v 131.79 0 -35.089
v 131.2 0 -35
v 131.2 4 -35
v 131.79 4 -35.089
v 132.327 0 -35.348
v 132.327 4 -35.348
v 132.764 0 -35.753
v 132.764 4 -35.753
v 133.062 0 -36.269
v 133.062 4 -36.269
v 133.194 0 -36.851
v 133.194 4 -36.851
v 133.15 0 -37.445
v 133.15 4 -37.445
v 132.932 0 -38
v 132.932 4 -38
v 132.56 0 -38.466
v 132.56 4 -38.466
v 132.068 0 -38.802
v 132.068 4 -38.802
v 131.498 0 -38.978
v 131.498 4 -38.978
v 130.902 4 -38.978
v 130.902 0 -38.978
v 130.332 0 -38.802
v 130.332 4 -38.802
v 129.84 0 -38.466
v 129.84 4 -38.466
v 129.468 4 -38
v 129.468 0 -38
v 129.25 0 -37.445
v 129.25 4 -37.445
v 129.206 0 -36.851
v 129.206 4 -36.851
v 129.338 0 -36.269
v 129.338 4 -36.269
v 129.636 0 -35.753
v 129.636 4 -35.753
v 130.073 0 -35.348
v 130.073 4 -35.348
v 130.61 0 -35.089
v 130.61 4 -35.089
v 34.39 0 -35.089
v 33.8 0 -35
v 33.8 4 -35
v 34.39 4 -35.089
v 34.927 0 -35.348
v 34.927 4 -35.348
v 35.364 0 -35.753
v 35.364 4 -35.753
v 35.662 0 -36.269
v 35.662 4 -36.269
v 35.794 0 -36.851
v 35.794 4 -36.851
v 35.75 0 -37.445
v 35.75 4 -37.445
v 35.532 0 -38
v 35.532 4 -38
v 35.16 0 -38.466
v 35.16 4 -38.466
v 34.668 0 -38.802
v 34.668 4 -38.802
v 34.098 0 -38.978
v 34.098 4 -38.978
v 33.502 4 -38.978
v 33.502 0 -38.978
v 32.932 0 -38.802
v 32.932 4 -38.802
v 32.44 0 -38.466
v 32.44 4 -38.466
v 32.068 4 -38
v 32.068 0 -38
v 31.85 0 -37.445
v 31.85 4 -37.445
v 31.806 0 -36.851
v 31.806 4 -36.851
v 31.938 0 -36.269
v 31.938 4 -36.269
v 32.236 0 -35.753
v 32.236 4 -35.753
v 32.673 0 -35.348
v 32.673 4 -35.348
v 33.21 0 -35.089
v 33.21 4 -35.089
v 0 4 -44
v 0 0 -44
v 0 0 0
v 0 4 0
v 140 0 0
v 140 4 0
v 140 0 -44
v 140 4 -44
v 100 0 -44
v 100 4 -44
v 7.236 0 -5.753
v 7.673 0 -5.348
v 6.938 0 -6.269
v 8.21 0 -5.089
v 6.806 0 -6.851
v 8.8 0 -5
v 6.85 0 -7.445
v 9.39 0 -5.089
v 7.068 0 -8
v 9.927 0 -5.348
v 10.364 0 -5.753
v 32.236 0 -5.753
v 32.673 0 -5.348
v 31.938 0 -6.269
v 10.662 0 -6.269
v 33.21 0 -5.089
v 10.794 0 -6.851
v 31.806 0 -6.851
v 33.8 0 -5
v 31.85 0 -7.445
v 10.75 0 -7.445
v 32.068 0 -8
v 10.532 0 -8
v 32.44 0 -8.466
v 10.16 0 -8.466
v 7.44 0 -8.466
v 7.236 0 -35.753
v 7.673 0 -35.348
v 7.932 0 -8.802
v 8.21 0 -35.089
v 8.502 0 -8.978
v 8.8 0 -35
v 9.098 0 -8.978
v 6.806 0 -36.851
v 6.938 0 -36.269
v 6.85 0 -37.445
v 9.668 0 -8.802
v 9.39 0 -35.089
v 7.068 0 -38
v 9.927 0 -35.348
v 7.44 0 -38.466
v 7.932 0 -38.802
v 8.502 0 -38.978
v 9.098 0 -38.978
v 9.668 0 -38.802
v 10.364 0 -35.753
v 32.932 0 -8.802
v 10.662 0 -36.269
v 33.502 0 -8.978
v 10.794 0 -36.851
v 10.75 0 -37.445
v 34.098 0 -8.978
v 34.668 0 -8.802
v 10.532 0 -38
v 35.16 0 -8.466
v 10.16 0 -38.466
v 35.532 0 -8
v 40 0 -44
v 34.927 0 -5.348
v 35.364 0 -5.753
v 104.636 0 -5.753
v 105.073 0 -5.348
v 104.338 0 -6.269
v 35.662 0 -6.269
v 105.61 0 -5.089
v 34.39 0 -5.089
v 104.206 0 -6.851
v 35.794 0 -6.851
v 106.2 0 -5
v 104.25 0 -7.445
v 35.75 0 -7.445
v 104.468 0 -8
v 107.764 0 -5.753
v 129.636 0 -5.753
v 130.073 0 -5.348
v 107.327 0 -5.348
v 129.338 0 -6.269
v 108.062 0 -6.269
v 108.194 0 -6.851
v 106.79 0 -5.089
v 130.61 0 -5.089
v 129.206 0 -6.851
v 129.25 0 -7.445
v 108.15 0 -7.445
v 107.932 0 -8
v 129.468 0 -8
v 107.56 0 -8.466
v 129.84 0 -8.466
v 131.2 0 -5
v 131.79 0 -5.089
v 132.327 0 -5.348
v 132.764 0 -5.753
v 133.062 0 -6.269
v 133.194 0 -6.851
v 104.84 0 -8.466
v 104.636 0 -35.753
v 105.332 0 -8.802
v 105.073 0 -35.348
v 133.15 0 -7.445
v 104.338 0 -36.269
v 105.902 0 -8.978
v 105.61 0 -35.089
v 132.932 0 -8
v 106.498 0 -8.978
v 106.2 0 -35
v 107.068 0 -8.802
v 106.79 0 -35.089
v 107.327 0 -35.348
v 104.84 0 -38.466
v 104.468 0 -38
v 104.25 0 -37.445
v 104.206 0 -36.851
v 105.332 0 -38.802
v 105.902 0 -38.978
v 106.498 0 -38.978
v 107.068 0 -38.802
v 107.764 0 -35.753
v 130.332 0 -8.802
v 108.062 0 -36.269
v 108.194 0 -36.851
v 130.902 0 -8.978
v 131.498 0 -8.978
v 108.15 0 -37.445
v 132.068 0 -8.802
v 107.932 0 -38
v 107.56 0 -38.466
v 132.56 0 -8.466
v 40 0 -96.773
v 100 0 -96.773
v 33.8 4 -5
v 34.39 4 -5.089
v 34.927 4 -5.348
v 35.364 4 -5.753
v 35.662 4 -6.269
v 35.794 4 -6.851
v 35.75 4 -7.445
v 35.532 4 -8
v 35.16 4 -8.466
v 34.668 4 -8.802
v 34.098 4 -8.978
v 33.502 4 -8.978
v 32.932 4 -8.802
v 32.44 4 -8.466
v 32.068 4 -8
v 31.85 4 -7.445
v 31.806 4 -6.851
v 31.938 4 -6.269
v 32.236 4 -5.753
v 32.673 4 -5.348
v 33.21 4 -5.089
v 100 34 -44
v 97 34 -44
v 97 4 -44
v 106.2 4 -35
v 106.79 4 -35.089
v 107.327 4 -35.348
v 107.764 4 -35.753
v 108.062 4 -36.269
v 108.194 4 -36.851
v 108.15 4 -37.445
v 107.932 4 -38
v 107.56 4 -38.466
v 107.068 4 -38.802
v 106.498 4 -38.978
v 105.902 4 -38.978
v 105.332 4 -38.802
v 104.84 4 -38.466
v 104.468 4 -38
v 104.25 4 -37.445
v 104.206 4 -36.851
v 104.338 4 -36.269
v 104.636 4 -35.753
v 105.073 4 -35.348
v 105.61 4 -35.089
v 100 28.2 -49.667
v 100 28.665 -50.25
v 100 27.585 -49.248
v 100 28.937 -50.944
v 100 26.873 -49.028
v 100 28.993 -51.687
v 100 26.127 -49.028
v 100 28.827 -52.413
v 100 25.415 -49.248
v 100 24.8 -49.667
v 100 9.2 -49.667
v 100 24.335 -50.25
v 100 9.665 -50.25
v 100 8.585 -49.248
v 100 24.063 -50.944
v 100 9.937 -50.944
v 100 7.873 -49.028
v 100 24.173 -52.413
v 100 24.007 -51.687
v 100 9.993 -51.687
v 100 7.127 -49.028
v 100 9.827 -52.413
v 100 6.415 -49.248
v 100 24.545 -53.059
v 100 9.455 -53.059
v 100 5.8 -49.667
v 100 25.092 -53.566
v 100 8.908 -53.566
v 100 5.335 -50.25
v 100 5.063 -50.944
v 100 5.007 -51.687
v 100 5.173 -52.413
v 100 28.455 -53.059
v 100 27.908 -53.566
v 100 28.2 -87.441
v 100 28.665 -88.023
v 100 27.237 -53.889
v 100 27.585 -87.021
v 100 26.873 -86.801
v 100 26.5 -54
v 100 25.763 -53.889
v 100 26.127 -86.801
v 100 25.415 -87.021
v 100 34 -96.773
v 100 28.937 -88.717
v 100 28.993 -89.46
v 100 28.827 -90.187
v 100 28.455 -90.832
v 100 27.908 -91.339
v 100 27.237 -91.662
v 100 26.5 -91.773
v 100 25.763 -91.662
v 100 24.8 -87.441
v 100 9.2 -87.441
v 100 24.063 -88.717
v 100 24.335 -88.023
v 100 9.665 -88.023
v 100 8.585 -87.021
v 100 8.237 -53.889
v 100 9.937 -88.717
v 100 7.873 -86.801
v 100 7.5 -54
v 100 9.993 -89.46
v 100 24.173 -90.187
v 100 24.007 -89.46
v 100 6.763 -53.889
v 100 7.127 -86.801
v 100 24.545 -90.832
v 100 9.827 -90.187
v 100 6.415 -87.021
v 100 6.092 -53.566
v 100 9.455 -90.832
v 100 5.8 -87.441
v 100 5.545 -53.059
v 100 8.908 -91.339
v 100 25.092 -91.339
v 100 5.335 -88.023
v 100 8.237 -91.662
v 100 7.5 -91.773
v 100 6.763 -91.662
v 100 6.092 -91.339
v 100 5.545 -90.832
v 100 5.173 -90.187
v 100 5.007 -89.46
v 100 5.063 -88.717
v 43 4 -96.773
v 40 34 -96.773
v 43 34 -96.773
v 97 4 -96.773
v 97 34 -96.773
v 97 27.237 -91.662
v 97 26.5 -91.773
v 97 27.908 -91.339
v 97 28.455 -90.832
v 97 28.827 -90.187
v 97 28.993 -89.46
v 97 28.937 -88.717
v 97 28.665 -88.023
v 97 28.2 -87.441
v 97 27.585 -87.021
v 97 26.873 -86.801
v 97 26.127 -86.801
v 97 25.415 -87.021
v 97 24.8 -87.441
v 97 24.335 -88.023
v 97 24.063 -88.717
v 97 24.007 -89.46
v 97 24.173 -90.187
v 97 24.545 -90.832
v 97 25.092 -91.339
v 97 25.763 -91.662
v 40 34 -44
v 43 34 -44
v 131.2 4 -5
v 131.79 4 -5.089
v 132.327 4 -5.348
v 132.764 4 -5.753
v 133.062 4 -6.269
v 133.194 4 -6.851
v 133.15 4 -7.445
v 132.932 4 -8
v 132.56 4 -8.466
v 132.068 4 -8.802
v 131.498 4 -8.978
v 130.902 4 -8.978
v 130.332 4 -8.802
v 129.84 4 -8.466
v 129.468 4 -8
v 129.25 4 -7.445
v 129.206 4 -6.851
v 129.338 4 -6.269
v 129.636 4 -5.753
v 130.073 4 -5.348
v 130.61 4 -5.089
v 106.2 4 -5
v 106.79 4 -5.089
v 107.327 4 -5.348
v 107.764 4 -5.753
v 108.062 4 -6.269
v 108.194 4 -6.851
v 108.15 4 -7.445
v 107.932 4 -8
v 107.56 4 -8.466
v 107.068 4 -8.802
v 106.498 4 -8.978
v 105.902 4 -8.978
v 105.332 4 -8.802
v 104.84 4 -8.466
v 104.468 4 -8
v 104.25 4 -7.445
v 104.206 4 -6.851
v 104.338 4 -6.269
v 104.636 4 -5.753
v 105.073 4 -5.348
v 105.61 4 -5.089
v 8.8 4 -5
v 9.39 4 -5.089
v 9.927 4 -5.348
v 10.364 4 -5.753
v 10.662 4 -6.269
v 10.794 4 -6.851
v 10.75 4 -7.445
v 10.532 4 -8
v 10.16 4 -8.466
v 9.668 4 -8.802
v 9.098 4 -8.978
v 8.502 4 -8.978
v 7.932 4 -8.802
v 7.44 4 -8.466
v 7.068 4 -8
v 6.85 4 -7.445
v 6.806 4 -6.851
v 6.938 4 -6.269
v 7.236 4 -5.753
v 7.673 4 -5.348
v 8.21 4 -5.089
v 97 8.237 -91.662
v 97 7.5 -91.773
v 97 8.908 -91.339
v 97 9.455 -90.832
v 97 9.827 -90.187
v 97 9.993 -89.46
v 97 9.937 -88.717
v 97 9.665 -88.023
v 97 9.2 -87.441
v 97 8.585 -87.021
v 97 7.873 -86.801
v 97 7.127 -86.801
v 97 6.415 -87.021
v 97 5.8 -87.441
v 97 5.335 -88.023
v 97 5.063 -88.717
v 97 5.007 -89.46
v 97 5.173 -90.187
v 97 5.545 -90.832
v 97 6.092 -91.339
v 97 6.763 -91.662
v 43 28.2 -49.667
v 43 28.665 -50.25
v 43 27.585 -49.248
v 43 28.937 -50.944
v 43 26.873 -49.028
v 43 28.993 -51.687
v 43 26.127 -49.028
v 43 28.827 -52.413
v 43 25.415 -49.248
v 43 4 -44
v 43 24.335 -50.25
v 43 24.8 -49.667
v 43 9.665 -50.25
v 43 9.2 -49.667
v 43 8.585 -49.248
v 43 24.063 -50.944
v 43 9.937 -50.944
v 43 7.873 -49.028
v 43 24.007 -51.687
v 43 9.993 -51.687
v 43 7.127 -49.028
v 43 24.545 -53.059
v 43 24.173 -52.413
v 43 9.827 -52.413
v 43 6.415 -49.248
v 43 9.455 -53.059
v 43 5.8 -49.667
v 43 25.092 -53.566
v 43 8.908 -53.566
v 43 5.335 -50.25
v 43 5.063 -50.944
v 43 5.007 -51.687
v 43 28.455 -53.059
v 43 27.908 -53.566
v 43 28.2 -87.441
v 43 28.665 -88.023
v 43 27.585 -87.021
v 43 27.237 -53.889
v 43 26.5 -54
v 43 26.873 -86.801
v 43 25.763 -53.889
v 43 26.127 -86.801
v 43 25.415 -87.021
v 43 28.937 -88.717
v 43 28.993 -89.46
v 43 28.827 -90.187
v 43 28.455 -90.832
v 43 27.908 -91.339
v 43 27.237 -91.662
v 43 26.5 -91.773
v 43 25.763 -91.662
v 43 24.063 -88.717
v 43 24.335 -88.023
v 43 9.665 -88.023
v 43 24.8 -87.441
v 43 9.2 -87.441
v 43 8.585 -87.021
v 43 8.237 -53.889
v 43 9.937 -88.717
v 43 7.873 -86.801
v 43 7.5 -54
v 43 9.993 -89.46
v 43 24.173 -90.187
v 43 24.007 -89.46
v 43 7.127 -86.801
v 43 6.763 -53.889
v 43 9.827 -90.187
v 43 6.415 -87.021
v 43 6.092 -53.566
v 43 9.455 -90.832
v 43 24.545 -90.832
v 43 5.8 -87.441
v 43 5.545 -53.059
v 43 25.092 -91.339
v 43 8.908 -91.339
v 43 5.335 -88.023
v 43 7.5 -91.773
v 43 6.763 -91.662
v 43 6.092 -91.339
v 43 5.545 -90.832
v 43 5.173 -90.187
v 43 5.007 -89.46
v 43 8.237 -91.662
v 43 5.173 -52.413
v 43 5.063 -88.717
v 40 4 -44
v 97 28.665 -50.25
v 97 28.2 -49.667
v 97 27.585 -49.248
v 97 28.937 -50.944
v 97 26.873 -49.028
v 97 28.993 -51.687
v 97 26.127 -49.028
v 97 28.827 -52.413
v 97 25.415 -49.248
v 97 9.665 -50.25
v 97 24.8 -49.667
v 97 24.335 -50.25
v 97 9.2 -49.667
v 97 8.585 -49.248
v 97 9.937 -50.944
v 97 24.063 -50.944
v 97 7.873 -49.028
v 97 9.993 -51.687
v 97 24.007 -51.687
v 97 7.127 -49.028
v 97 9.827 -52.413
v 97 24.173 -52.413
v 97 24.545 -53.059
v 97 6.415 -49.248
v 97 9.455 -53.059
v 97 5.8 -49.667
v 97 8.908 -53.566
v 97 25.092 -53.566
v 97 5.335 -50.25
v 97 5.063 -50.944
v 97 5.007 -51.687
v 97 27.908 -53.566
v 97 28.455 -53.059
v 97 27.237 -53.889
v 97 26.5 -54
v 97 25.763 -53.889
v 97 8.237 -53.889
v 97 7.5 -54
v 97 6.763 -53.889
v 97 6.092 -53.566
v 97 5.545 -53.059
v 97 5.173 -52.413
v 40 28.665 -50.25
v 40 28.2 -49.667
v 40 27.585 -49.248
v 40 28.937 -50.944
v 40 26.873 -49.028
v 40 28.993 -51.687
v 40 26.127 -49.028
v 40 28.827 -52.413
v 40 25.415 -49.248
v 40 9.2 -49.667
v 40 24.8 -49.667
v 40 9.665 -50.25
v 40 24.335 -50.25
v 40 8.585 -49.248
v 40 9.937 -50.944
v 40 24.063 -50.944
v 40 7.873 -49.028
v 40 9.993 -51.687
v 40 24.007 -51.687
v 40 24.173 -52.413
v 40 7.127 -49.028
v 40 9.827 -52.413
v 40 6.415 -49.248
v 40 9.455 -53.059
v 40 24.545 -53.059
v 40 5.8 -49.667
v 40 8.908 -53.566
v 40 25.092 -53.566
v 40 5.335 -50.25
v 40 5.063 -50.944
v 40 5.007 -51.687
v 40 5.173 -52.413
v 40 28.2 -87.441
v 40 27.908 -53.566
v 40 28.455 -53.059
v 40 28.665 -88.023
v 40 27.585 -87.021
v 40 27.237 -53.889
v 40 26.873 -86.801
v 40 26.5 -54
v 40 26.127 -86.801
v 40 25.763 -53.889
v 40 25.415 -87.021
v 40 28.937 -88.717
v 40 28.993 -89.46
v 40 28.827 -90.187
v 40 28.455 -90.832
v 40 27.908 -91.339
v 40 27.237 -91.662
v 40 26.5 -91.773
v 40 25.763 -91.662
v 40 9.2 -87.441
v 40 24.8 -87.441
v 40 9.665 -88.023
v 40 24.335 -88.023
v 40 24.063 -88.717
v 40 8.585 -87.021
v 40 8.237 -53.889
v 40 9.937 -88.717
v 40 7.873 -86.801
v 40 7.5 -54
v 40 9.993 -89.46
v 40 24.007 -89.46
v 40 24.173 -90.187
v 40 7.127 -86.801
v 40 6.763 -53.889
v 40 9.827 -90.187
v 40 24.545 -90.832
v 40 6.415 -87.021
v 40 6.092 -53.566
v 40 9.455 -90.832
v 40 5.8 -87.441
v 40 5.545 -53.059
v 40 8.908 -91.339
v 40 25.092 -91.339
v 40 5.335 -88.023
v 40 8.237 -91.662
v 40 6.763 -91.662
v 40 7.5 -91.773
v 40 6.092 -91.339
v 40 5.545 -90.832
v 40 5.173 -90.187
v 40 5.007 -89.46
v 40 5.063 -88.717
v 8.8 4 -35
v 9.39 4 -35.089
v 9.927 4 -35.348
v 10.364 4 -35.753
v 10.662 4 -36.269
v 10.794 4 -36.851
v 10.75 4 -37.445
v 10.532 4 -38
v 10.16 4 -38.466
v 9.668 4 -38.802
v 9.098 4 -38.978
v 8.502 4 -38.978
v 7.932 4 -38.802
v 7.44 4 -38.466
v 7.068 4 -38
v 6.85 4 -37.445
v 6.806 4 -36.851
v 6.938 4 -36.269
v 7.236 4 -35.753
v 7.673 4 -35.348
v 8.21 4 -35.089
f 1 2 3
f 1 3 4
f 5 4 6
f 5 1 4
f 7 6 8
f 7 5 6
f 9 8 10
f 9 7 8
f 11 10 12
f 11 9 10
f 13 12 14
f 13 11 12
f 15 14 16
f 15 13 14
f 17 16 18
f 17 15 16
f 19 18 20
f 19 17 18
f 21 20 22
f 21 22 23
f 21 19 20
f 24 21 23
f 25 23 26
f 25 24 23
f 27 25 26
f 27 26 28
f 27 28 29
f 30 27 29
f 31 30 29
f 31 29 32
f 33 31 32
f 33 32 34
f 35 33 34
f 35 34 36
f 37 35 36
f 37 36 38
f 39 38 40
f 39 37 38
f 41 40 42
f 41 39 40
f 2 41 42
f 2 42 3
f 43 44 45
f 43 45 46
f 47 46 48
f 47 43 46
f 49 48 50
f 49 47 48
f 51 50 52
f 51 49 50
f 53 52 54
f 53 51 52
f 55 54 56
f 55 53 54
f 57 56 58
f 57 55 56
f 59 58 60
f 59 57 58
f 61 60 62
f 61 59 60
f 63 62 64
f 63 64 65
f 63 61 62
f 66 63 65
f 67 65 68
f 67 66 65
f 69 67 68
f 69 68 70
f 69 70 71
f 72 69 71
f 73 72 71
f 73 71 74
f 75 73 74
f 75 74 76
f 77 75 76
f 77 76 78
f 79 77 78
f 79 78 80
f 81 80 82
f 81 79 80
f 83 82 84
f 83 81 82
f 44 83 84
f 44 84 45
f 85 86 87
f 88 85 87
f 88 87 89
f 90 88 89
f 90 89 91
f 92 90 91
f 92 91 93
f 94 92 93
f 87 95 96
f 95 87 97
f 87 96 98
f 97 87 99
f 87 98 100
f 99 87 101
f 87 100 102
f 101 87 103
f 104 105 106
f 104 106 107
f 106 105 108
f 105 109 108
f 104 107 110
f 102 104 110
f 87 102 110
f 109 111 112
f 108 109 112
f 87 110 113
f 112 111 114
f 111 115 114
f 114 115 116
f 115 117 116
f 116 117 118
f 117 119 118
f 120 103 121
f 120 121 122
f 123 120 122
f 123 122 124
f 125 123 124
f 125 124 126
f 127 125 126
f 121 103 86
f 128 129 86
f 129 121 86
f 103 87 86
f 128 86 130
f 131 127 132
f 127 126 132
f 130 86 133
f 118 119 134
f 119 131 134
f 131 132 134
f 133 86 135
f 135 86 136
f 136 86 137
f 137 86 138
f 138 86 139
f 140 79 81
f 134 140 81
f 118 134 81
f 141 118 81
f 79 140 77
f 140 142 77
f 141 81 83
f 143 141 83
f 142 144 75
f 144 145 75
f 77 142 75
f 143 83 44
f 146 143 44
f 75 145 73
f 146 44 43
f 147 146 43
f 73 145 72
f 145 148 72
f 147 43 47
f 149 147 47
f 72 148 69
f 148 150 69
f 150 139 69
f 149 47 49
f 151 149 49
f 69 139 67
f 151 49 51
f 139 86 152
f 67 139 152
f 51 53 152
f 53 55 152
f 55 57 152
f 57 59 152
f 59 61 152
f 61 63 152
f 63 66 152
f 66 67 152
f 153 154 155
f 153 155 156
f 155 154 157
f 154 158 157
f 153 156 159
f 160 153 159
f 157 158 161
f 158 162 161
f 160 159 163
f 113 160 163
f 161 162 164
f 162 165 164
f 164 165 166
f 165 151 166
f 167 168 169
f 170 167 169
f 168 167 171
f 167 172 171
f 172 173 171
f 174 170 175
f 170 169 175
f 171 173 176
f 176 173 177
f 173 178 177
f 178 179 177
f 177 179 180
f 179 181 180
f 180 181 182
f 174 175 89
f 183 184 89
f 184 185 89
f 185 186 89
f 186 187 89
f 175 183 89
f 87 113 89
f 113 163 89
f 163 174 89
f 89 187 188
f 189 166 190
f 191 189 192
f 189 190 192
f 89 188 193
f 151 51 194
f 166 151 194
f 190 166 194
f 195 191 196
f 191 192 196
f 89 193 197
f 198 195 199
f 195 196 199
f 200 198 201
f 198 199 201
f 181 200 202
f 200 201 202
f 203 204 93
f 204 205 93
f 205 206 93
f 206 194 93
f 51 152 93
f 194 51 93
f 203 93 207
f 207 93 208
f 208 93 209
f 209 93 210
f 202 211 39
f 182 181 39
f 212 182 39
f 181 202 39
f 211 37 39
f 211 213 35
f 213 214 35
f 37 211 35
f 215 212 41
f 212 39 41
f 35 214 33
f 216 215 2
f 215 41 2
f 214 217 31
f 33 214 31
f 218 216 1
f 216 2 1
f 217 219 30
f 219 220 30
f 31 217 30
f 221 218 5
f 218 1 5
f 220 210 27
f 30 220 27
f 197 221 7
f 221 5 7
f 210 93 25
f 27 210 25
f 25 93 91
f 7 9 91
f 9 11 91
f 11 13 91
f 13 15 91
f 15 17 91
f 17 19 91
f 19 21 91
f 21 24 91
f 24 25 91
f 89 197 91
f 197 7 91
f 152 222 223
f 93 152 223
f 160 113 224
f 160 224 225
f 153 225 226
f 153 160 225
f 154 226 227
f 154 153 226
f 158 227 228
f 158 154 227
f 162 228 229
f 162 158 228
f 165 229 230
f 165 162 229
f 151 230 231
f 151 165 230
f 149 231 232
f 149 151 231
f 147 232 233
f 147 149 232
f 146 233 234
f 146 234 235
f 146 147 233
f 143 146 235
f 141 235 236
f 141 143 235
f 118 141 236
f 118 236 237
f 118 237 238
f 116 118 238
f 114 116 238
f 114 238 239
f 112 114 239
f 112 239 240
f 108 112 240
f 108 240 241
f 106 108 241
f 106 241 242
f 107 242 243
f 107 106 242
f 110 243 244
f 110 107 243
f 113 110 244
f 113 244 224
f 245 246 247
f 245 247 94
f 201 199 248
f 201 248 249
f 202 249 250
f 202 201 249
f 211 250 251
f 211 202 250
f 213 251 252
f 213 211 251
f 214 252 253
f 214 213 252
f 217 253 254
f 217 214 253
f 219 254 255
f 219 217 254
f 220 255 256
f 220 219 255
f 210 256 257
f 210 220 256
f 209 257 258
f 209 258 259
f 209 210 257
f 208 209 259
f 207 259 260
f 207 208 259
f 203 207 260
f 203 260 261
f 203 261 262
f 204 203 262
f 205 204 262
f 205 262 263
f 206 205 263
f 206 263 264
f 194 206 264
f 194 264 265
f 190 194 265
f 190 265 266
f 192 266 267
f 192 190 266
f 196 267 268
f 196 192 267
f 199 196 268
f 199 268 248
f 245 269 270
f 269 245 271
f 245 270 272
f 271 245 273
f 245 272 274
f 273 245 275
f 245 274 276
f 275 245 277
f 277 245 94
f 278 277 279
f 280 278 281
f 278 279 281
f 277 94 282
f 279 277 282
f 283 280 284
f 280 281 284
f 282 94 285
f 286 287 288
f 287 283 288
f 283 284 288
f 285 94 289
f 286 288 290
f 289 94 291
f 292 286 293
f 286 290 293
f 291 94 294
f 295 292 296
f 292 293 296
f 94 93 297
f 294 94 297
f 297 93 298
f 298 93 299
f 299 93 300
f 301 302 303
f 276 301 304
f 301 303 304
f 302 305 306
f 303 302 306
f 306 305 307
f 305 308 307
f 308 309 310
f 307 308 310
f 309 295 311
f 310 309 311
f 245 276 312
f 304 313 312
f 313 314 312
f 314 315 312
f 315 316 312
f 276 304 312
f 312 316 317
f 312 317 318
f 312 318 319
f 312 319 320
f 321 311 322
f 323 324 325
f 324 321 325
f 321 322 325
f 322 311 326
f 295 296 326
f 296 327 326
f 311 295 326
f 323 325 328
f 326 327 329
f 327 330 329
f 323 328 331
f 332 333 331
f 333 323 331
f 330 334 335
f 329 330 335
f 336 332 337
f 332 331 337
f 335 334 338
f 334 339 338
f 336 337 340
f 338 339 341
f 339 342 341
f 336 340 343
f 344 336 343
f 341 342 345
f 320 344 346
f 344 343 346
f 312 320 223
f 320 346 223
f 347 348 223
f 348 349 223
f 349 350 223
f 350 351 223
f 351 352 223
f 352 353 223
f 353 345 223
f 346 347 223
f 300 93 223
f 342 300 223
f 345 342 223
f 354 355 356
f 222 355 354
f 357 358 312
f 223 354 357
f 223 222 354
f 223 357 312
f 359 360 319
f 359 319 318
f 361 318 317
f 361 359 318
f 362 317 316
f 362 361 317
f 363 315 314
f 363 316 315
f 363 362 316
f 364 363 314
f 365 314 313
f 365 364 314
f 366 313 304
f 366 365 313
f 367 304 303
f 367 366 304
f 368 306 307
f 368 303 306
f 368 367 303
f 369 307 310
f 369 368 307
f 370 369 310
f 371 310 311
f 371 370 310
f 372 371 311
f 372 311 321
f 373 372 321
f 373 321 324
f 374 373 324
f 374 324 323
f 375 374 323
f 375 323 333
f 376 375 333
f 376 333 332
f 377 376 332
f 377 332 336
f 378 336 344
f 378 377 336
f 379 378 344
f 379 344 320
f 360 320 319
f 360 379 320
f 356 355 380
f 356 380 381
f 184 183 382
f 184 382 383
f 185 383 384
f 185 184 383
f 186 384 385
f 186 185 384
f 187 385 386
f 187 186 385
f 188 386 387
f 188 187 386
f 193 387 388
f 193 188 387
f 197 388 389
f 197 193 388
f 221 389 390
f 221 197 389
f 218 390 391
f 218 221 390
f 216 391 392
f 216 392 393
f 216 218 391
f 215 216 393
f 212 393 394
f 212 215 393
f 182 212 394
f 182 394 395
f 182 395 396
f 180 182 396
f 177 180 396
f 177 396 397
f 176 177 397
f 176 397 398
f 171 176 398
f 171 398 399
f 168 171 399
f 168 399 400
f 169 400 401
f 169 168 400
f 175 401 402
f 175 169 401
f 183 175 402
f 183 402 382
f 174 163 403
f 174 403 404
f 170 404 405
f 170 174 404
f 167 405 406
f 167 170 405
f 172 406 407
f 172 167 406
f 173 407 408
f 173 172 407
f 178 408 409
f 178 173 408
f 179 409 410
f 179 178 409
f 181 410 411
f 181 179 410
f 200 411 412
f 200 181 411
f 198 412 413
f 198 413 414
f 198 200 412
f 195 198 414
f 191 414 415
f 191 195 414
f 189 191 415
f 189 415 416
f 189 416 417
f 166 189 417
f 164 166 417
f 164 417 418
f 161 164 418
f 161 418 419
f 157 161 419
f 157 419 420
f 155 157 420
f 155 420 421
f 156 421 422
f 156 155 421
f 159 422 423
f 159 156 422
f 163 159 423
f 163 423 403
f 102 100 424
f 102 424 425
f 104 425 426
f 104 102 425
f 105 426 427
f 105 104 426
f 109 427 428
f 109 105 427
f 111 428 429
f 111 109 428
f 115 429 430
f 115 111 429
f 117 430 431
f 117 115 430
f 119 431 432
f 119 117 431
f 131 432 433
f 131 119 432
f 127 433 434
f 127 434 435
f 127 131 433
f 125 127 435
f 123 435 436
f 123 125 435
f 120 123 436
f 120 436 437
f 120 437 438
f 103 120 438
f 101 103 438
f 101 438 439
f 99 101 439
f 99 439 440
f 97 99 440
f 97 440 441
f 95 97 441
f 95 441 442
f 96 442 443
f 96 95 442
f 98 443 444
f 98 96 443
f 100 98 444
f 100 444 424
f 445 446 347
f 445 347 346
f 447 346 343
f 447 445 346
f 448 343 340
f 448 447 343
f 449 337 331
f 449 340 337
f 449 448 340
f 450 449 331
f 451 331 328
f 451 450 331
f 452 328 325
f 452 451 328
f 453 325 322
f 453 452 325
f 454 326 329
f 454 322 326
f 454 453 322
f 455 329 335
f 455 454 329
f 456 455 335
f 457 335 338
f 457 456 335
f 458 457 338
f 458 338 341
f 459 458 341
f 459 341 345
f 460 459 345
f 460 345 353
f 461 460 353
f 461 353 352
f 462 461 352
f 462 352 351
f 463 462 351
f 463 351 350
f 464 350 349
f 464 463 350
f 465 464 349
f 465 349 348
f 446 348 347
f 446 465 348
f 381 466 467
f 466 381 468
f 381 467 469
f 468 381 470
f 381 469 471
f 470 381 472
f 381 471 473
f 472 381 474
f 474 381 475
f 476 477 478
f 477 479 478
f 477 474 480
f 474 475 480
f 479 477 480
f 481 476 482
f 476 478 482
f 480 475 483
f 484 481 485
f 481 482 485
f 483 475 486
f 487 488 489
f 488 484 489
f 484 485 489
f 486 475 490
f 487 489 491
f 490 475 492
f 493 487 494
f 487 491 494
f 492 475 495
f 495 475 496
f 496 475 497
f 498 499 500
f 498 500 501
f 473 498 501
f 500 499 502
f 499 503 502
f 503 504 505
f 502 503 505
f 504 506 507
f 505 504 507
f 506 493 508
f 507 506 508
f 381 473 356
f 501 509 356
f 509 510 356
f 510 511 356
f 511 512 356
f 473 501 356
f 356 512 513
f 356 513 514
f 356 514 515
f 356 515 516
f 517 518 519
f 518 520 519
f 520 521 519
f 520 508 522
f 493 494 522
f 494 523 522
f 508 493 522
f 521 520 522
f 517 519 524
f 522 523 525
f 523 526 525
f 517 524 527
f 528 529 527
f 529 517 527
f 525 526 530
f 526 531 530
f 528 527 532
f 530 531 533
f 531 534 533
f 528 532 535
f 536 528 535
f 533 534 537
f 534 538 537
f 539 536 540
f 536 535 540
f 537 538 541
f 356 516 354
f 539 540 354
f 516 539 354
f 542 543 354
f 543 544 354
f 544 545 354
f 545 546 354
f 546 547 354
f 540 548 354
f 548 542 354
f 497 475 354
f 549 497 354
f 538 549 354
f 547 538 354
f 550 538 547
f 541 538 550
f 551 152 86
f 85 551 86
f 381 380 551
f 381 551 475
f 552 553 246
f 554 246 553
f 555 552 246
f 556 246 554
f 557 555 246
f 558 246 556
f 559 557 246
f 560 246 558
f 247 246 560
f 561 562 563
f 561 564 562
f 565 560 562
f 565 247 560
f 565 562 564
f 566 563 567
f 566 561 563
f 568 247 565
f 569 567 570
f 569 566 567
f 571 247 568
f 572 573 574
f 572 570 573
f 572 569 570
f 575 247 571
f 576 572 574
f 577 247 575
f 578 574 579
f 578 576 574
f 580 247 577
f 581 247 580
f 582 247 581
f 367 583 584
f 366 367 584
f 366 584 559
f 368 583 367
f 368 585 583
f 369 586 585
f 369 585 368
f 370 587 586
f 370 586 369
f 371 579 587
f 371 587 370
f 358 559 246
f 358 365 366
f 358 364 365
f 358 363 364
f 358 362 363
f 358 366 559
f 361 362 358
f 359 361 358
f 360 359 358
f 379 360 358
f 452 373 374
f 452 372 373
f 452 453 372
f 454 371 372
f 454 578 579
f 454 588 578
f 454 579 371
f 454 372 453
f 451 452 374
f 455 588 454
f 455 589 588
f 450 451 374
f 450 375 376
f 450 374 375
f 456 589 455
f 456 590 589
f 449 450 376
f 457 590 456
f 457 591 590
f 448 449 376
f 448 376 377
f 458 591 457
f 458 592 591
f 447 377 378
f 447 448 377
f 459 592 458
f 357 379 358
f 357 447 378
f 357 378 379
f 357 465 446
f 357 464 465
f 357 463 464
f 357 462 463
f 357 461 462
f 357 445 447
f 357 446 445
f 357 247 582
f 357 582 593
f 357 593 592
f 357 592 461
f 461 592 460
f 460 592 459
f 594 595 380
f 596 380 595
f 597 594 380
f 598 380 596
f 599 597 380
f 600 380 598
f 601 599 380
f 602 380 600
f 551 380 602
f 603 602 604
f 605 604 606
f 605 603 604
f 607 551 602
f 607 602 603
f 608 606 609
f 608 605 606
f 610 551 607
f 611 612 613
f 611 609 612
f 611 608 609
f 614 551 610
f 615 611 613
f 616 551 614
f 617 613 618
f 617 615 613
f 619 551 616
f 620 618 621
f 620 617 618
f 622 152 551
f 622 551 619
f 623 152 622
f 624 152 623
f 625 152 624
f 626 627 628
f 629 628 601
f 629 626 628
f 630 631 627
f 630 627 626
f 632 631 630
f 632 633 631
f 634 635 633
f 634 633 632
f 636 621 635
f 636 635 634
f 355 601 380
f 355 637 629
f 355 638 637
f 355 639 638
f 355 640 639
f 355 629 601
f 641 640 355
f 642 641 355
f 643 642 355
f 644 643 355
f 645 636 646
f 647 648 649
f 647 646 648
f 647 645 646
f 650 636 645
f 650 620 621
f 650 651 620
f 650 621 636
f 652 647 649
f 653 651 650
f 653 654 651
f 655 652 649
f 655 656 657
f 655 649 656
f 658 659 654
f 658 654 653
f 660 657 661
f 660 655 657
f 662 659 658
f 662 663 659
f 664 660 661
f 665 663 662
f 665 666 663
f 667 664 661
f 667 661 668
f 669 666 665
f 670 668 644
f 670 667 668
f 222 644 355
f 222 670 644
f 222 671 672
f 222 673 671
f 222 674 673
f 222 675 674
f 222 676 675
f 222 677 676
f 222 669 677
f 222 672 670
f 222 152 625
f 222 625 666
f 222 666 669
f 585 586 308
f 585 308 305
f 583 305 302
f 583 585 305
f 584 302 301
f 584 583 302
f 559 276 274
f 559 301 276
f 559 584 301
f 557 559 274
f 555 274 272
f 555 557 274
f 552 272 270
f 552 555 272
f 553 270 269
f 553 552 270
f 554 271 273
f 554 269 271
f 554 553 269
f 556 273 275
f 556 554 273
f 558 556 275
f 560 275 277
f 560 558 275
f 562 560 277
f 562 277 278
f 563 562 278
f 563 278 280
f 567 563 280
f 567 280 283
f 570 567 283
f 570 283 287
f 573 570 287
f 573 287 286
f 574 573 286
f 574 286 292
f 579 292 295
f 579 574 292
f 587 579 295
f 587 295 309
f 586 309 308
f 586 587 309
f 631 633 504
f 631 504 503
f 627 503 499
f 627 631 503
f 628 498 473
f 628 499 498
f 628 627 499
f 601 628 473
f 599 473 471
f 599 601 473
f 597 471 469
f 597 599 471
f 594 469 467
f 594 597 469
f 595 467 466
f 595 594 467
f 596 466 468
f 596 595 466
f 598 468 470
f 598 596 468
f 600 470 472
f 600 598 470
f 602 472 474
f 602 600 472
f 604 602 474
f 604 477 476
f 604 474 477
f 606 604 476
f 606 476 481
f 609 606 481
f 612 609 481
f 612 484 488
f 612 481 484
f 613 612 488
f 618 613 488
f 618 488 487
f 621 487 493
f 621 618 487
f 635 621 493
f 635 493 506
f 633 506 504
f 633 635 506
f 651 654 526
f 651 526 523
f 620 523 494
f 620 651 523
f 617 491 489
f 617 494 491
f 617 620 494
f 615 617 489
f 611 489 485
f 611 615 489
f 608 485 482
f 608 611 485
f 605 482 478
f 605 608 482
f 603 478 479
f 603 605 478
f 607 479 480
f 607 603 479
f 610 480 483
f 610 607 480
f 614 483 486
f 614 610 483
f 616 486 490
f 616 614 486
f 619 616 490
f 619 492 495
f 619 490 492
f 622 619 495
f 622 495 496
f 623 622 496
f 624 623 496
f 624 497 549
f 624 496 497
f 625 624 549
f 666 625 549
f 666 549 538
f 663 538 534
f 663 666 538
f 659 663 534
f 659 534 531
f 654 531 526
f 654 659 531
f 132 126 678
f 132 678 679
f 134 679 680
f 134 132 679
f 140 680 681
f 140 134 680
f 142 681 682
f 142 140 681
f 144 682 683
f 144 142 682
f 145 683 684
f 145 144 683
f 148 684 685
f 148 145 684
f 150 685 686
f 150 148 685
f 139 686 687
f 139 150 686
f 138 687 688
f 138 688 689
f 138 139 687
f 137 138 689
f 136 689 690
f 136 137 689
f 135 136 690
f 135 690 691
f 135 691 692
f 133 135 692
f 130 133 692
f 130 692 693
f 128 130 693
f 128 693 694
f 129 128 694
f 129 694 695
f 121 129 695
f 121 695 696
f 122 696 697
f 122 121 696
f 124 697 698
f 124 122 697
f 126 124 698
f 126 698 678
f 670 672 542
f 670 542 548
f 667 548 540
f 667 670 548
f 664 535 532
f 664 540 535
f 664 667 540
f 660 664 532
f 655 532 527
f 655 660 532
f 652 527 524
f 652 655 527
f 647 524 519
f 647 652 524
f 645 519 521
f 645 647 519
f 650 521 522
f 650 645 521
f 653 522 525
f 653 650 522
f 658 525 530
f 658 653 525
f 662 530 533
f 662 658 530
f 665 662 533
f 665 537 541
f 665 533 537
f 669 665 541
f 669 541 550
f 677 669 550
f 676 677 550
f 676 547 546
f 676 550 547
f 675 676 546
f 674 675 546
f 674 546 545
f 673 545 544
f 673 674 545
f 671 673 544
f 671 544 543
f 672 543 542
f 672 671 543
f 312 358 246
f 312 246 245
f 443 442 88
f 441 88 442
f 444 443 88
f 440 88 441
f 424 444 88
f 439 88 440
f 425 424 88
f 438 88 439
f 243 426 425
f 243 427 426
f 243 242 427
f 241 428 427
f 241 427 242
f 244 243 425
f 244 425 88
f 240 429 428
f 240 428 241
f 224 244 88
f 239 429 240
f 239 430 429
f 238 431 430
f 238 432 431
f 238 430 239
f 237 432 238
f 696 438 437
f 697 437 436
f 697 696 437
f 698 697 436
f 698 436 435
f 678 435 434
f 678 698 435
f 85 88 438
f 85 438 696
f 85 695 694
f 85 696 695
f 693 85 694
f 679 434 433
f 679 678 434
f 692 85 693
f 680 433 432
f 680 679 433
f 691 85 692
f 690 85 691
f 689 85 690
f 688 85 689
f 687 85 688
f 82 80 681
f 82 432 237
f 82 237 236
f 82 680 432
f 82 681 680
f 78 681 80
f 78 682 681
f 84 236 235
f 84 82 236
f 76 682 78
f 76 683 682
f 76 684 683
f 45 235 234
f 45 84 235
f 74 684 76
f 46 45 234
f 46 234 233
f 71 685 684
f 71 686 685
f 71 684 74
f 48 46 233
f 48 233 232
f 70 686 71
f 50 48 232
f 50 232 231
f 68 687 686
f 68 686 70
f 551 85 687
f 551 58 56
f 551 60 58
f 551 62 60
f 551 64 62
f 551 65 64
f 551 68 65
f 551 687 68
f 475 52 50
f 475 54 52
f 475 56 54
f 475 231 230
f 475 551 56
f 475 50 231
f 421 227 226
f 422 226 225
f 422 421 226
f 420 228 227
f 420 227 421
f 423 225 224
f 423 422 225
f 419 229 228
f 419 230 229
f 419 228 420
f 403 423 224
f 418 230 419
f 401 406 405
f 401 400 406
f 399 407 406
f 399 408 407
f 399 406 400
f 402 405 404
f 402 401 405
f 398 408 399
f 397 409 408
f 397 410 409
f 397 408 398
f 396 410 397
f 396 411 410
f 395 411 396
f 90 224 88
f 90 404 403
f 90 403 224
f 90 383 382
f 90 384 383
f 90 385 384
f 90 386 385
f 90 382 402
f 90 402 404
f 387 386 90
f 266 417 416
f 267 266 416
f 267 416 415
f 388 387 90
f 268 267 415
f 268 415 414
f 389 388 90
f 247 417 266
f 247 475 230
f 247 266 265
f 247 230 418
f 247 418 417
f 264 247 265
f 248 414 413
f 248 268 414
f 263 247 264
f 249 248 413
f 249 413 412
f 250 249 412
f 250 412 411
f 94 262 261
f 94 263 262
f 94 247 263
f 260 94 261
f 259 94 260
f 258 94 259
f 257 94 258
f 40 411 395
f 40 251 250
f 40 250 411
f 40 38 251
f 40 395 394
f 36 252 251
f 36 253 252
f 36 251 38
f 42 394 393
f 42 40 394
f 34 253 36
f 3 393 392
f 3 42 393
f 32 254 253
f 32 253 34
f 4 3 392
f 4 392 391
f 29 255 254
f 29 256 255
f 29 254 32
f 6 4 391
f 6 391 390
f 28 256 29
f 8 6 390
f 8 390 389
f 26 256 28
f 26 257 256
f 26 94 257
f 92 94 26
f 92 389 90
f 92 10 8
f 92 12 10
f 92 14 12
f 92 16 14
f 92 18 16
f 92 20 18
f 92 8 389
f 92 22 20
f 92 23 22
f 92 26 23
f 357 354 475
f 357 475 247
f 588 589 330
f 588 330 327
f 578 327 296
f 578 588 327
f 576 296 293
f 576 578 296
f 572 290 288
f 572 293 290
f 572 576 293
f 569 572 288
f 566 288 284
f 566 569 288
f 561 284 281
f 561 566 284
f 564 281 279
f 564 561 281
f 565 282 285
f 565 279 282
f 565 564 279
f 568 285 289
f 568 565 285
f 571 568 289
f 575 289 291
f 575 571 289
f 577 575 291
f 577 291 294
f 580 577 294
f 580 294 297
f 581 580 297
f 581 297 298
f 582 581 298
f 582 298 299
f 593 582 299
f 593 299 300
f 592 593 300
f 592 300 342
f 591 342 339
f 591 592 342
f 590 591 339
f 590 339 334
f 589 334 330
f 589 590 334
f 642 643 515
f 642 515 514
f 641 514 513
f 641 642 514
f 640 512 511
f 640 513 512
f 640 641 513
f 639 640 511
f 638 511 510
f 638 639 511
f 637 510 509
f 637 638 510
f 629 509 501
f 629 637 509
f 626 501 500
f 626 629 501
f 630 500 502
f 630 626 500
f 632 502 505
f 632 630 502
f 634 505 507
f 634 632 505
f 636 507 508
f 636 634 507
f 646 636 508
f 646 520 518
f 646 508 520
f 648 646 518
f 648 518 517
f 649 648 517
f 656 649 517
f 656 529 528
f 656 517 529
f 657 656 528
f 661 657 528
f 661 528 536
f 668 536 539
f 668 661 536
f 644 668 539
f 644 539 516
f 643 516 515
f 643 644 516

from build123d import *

# Parameters (mm, degrees)
SKETCH_1_R               = 2
EXTRUDE_1_DEPTH          = 4
SKETCH_1_3_W             = 3
SKETCH_1_3_H             = 52.773364798
EXTRUDE_2_DEPTH          = 34
CUT_EXTRUDE_1_DEPTH      = 174.554268557
CUT_EXTRUDE_1_DEPTH_BACK = 174.554268557
SKETCH_2_R               = 2.5


with BuildPart() as part:
    # 草图1 → 凸台-拉伸1 (new body)
    with BuildSketch(Plane(origin=(0, 0, 0), x_dir=(1, 0, 0), z_dir=(0, 1, 0))):
        Polygon((0, 0), (140, 0), (140, 44), (97, 44), (97, 96.773364798), (43, 96.773364798), (43, 44), (0, 44), align=None)
        with Locations((8.8, 7)):
            Circle(SKETCH_1_R, mode=Mode.SUBTRACT)
        with Locations((33.8, 7)):
            Circle(SKETCH_1_R, mode=Mode.SUBTRACT)
        with Locations((8.8, 37)):
            Circle(SKETCH_1_R, mode=Mode.SUBTRACT)
        with Locations((33.8, 37)):
            Circle(SKETCH_1_R, mode=Mode.SUBTRACT)
        with Locations((131.2, 37)):
            Circle(SKETCH_1_R, mode=Mode.SUBTRACT)
        with Locations((106.2, 37)):
            Circle(SKETCH_1_R, mode=Mode.SUBTRACT)
        with Locations((106.2, 7)):
            Circle(SKETCH_1_R, mode=Mode.SUBTRACT)
        with Locations((131.2, 7)):
            Circle(SKETCH_1_R, mode=Mode.SUBTRACT)
    extrude(amount=EXTRUDE_1_DEPTH)

    # 草图1<3> → 凸台-拉伸2 (add)
    with BuildSketch(Plane(origin=(0, 0, 0), x_dir=(1, 0, 0), z_dir=(0, 1, 0))):
        with Locations((41.5, 70.386682399)):
            Rectangle(SKETCH_1_3_W, SKETCH_1_3_H)
        with Locations((98.5, 70.386682399)):
            Rectangle(SKETCH_1_3_W, SKETCH_1_3_H)
    extrude(amount=EXTRUDE_2_DEPTH)

    # 草图2 → 切除-拉伸1 (cut, two sides: drawn at the far end of the back side and taken through both)
    with BuildSketch(Plane(origin=(0, 0, 0), x_dir=(0, 0, -1), z_dir=(1, 0, 0)).offset(-CUT_EXTRUDE_1_DEPTH_BACK)):
        with Locations((51.5, 7.5)):
            Circle(SKETCH_2_R)
        with Locations((89.273364798, 7.5)):
            Circle(SKETCH_2_R)
        with Locations((89.273364798, 26.5)):
            Circle(SKETCH_2_R)
        with Locations((51.5, 26.5)):
            Circle(SKETCH_2_R)
    extrude(amount=CUT_EXTRUDE_1_DEPTH + CUT_EXTRUDE_1_DEPTH_BACK, mode=Mode.SUBTRACT)


solid = part.part
